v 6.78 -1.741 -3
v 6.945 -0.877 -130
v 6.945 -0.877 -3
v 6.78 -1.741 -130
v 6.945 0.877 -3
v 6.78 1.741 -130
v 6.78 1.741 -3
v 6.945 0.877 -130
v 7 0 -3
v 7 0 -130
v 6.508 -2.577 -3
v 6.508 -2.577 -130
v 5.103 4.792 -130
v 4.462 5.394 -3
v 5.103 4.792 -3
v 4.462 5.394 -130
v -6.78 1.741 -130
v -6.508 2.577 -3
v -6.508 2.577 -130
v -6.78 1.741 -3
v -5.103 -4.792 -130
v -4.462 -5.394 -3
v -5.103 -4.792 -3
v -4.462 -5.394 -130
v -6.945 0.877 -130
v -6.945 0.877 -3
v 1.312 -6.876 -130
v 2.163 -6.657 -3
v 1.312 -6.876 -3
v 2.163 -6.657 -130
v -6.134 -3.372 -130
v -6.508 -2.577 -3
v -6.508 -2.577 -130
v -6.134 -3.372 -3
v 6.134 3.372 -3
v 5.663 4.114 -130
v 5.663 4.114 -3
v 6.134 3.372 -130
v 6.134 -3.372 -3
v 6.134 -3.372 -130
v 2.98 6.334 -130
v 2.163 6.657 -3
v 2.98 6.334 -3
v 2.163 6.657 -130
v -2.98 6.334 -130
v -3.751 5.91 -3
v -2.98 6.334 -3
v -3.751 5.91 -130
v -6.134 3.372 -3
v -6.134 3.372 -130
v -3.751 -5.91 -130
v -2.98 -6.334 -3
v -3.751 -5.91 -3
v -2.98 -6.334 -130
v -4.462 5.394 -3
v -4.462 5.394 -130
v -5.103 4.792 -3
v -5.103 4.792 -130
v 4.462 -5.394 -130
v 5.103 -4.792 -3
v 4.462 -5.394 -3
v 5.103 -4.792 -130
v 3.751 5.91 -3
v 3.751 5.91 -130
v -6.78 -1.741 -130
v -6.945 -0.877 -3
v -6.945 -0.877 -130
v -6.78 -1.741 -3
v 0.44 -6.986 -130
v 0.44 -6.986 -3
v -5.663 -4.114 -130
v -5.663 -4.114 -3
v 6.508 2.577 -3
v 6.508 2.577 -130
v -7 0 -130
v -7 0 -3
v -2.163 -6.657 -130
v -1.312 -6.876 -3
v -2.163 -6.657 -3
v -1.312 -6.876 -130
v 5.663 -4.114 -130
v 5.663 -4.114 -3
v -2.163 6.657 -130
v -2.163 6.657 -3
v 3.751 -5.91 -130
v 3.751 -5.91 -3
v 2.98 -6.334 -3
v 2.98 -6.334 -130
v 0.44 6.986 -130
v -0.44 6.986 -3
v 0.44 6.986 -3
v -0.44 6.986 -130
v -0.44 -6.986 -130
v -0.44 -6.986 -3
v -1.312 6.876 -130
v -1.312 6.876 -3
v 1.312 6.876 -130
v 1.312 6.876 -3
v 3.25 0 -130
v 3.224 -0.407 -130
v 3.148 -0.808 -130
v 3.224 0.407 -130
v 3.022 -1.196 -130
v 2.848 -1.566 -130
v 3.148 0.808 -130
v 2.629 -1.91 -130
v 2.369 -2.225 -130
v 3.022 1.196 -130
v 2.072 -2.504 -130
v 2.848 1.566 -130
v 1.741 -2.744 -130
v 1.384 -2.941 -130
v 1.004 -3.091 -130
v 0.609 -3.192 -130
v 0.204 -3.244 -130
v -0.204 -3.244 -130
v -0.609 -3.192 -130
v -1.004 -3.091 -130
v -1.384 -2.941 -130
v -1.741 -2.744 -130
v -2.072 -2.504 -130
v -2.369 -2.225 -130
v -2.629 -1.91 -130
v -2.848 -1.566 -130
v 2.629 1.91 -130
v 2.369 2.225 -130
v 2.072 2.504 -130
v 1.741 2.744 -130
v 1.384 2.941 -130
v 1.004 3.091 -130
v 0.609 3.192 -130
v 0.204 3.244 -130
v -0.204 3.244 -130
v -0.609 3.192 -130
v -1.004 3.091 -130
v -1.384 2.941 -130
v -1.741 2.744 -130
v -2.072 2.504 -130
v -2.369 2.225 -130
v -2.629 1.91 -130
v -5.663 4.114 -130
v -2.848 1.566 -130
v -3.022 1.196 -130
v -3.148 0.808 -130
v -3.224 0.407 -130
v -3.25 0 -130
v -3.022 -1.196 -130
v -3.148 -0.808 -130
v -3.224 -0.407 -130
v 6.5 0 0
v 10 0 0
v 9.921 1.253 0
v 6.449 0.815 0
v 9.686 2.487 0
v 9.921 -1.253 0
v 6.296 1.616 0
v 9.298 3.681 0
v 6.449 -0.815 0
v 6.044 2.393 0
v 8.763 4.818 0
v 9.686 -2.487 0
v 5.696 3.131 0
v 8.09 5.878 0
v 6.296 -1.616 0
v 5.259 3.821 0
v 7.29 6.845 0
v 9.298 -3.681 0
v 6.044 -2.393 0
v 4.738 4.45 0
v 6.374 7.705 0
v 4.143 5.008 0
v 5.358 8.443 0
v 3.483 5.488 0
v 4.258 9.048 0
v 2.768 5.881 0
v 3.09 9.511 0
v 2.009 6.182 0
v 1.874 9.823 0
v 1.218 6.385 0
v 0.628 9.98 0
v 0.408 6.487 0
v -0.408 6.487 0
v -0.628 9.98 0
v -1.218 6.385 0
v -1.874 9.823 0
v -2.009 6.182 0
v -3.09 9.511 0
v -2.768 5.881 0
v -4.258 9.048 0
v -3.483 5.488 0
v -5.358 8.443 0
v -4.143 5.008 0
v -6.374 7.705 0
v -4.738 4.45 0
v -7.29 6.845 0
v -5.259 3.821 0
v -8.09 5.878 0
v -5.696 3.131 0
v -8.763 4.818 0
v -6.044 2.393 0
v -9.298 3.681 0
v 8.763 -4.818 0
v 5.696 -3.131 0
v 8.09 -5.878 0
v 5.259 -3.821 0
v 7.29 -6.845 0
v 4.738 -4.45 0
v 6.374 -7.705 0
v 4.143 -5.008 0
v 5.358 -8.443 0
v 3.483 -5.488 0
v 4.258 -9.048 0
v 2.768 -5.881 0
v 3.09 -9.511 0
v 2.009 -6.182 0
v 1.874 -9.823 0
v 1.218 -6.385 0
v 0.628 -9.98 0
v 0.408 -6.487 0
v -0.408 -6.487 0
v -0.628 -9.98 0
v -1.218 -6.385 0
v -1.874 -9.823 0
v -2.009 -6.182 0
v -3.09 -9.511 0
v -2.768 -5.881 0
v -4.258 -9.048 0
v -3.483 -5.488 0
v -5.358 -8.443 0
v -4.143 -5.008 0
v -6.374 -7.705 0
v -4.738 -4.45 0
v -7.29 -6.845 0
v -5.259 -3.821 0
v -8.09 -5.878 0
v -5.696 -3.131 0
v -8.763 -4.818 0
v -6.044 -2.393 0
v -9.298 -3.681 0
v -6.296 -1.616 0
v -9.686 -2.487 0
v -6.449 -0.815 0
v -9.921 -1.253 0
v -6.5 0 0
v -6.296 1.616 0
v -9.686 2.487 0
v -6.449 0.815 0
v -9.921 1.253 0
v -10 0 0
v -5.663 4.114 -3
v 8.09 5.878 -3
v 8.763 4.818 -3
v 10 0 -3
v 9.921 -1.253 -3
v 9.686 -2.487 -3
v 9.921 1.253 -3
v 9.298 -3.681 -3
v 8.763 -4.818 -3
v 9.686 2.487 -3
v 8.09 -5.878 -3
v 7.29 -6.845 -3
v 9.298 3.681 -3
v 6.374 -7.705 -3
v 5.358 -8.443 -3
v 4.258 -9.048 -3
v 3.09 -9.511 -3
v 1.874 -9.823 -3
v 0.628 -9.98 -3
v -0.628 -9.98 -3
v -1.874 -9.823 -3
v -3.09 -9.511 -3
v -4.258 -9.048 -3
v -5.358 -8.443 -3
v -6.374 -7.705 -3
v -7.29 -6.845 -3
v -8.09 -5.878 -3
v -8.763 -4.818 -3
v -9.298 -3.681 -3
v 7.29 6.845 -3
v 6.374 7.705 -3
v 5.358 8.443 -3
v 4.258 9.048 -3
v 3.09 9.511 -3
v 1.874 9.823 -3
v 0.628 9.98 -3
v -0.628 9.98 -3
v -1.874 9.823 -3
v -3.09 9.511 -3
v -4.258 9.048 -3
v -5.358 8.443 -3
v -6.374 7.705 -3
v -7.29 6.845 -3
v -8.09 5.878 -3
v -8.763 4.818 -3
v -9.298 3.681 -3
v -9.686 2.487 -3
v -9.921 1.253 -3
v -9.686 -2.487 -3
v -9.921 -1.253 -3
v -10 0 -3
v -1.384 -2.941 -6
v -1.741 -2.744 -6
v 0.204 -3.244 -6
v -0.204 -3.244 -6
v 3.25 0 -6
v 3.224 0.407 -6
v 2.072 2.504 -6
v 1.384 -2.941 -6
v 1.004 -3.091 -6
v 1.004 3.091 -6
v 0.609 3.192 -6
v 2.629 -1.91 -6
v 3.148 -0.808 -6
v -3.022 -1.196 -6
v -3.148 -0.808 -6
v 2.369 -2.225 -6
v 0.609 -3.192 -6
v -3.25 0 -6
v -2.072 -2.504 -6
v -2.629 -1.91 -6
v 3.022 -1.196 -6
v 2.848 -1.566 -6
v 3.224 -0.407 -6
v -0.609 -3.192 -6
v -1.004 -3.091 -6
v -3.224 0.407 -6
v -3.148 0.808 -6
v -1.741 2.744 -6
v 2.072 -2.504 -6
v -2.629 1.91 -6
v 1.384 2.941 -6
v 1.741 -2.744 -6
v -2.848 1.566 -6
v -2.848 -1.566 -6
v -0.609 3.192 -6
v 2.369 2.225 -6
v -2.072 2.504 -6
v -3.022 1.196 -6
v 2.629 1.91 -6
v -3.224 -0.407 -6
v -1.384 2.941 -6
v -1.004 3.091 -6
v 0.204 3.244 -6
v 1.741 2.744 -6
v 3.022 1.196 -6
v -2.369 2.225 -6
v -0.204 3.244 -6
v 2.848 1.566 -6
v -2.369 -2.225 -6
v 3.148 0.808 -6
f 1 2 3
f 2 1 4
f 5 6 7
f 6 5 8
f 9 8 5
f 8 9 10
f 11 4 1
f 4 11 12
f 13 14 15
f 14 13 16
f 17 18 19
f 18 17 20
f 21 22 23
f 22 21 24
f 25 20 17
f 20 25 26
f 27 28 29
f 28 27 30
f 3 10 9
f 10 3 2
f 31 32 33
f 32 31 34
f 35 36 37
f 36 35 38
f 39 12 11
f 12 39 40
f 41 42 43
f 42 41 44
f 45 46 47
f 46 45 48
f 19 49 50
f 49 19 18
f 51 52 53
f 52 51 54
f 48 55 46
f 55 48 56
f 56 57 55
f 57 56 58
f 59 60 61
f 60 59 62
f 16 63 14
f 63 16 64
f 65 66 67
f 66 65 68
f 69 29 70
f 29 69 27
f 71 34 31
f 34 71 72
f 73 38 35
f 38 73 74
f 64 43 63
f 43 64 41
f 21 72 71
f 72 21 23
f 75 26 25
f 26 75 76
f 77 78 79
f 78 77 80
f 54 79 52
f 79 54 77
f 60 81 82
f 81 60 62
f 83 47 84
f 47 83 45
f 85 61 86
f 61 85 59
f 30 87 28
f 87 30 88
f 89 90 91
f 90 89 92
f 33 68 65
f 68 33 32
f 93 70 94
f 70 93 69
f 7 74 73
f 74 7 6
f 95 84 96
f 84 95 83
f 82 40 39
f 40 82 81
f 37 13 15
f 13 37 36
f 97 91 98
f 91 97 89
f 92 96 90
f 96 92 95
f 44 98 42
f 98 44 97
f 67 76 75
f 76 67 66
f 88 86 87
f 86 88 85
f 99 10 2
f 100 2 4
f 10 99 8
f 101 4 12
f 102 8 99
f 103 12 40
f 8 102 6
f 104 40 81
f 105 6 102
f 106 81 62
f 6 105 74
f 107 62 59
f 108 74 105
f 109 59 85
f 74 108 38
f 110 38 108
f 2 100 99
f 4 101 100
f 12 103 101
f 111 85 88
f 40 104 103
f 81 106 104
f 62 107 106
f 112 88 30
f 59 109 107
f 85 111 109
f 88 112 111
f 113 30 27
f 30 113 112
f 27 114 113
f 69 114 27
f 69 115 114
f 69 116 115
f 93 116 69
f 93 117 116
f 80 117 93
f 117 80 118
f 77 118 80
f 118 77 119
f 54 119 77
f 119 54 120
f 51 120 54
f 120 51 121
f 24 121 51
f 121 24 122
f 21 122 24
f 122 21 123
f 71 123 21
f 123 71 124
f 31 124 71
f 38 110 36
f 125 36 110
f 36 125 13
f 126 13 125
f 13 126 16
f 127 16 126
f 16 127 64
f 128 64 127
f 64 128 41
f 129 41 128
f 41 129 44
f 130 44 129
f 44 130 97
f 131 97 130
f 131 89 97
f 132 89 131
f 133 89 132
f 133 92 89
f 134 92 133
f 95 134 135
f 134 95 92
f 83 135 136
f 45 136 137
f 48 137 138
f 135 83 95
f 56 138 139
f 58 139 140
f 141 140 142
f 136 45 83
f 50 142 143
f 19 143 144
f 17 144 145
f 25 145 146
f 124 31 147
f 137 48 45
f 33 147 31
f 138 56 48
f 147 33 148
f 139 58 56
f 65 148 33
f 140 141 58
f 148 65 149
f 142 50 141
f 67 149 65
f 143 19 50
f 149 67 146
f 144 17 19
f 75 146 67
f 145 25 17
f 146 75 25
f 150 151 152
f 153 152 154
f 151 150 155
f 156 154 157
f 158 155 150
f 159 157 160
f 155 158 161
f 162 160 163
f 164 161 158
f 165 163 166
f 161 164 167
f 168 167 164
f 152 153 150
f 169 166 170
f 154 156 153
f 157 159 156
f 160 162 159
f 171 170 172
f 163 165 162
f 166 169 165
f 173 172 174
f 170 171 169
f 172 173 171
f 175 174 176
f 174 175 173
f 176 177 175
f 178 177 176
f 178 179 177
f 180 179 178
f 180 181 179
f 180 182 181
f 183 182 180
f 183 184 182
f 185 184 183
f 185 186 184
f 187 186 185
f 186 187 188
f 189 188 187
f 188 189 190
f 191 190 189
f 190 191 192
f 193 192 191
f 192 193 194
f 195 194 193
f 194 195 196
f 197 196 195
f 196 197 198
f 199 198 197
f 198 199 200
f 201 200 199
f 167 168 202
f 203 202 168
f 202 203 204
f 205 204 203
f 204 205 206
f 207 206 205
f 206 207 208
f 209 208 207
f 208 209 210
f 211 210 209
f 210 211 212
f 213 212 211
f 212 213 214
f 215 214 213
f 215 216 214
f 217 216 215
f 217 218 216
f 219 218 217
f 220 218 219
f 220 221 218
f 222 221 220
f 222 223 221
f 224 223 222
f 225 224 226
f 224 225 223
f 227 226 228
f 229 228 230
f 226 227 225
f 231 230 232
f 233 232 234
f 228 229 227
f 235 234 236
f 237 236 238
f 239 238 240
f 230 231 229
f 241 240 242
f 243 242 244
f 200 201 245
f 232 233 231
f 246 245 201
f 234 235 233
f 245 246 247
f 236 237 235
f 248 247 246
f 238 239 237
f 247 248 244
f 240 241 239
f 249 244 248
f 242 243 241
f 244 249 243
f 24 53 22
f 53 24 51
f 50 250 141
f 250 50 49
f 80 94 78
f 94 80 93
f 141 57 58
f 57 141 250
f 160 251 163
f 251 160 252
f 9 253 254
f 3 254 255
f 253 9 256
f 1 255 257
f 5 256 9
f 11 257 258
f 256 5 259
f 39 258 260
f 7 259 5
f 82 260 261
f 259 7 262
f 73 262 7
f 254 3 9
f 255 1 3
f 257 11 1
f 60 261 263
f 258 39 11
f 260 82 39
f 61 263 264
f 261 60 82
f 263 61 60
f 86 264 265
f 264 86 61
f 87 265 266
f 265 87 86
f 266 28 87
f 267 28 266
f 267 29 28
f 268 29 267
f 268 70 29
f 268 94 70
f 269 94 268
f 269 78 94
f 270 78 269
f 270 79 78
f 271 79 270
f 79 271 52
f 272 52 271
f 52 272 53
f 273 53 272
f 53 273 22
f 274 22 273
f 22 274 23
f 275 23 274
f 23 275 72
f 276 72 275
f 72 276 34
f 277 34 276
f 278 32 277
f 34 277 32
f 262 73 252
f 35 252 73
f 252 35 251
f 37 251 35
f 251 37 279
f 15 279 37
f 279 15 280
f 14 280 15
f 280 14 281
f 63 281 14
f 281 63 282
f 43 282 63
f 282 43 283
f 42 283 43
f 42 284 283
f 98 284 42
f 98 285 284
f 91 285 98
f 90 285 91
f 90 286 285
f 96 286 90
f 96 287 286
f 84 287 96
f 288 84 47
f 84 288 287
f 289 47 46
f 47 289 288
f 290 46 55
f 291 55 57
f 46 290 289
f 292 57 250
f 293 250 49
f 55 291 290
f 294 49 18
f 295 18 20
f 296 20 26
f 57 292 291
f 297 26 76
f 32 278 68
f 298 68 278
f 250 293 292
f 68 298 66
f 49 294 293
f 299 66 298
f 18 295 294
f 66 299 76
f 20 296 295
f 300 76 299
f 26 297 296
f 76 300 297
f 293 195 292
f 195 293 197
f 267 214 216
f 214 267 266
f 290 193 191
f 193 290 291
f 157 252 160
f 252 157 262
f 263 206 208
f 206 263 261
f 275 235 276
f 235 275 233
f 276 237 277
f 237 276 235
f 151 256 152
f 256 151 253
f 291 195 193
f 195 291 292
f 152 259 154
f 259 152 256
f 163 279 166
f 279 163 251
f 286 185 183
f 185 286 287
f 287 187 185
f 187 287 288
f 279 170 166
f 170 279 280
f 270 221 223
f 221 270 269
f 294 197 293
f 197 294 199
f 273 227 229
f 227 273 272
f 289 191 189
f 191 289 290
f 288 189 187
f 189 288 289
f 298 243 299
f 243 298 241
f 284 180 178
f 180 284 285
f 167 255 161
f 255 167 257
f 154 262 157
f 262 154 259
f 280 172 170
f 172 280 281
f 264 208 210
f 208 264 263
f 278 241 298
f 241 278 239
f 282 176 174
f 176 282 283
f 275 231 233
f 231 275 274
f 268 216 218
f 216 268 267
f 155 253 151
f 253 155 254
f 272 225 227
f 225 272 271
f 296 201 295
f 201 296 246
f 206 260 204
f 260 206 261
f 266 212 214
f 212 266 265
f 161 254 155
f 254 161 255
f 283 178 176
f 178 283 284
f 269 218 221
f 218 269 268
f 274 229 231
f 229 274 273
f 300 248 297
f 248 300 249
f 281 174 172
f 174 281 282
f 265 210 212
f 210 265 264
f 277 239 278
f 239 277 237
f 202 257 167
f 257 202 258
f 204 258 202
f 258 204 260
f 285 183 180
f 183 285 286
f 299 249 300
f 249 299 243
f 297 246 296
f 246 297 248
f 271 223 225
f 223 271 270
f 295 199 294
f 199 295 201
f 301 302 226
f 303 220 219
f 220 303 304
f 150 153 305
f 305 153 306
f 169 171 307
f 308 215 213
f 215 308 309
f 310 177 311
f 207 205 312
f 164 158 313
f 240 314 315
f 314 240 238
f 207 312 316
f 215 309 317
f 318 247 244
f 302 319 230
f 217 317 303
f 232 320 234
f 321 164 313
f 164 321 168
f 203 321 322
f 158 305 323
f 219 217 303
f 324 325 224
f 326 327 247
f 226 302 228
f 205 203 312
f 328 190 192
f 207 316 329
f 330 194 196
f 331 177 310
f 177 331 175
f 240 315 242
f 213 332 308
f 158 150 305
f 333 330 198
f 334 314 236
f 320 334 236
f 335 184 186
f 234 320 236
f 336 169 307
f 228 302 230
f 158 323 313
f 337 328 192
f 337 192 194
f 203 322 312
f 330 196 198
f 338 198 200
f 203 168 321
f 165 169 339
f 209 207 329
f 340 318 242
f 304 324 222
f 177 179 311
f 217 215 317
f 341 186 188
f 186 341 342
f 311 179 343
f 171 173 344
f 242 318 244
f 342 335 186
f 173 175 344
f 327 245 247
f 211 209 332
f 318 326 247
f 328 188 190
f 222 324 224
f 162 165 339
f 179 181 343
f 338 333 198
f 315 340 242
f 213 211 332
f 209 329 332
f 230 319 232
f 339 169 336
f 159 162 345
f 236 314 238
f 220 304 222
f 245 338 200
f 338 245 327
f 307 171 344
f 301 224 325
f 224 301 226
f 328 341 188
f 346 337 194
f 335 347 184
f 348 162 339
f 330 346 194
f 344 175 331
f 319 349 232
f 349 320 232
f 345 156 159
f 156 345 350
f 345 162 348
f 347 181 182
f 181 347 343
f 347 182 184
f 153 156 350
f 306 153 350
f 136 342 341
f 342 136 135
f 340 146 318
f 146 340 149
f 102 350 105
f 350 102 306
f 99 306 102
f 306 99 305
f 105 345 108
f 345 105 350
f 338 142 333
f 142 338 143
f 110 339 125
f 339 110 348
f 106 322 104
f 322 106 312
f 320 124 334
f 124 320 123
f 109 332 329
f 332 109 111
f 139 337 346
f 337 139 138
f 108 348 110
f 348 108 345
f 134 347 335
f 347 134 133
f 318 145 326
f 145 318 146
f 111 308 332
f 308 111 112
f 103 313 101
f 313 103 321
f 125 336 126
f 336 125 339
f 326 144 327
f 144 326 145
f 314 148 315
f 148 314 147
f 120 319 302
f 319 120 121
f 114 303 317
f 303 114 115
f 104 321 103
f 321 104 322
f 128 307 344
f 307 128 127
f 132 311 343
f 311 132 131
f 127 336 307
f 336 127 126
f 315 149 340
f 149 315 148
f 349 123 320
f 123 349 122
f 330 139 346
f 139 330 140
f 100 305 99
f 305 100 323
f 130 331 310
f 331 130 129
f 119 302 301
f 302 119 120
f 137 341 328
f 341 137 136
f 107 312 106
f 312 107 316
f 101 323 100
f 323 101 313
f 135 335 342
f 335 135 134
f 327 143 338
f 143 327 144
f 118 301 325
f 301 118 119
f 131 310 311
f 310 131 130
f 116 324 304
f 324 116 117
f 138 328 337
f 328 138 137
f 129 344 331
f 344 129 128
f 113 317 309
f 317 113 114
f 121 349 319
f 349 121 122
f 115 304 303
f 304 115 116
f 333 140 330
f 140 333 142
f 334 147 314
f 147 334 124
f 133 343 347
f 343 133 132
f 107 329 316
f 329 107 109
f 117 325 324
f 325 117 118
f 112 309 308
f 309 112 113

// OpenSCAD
$fn = 50;


difference() {
	union() {
		translate(v = [0, 0, -130.0000000000]) {
			cylinder(h = 130, r = 7.0000000000);
		}
		translate(v = [0, 0, -3.0000000000]) {
			cylinder(h = 3, r = 10.0000000000);
		}
	}
	union() {
		translate(v = [0, 0, 0]) {
			rotate(a = [0, 0, 0]) {
				difference() {
					union() {
						#translate(v = [0, 0, -130.0000000000]) {
							cylinder(h = 130, r = 2.2500000000);
						}
						#translate(v = [0, 0, -6]) {
							cylinder(h = 6, r1 = 3.2500000000, r2 = 6.5000000000);
						}
						#translate(v = [0, 0, -130.0000000000]) {
							cylinder(h = 130, r = 3.2500000000);
						}
						#translate(v = [0, 0, -130.0000000000]) {
							cylinder(h = 130, r = 2.2500000000);
						}
					}
					union();
				}
			}
		}
	}
}
